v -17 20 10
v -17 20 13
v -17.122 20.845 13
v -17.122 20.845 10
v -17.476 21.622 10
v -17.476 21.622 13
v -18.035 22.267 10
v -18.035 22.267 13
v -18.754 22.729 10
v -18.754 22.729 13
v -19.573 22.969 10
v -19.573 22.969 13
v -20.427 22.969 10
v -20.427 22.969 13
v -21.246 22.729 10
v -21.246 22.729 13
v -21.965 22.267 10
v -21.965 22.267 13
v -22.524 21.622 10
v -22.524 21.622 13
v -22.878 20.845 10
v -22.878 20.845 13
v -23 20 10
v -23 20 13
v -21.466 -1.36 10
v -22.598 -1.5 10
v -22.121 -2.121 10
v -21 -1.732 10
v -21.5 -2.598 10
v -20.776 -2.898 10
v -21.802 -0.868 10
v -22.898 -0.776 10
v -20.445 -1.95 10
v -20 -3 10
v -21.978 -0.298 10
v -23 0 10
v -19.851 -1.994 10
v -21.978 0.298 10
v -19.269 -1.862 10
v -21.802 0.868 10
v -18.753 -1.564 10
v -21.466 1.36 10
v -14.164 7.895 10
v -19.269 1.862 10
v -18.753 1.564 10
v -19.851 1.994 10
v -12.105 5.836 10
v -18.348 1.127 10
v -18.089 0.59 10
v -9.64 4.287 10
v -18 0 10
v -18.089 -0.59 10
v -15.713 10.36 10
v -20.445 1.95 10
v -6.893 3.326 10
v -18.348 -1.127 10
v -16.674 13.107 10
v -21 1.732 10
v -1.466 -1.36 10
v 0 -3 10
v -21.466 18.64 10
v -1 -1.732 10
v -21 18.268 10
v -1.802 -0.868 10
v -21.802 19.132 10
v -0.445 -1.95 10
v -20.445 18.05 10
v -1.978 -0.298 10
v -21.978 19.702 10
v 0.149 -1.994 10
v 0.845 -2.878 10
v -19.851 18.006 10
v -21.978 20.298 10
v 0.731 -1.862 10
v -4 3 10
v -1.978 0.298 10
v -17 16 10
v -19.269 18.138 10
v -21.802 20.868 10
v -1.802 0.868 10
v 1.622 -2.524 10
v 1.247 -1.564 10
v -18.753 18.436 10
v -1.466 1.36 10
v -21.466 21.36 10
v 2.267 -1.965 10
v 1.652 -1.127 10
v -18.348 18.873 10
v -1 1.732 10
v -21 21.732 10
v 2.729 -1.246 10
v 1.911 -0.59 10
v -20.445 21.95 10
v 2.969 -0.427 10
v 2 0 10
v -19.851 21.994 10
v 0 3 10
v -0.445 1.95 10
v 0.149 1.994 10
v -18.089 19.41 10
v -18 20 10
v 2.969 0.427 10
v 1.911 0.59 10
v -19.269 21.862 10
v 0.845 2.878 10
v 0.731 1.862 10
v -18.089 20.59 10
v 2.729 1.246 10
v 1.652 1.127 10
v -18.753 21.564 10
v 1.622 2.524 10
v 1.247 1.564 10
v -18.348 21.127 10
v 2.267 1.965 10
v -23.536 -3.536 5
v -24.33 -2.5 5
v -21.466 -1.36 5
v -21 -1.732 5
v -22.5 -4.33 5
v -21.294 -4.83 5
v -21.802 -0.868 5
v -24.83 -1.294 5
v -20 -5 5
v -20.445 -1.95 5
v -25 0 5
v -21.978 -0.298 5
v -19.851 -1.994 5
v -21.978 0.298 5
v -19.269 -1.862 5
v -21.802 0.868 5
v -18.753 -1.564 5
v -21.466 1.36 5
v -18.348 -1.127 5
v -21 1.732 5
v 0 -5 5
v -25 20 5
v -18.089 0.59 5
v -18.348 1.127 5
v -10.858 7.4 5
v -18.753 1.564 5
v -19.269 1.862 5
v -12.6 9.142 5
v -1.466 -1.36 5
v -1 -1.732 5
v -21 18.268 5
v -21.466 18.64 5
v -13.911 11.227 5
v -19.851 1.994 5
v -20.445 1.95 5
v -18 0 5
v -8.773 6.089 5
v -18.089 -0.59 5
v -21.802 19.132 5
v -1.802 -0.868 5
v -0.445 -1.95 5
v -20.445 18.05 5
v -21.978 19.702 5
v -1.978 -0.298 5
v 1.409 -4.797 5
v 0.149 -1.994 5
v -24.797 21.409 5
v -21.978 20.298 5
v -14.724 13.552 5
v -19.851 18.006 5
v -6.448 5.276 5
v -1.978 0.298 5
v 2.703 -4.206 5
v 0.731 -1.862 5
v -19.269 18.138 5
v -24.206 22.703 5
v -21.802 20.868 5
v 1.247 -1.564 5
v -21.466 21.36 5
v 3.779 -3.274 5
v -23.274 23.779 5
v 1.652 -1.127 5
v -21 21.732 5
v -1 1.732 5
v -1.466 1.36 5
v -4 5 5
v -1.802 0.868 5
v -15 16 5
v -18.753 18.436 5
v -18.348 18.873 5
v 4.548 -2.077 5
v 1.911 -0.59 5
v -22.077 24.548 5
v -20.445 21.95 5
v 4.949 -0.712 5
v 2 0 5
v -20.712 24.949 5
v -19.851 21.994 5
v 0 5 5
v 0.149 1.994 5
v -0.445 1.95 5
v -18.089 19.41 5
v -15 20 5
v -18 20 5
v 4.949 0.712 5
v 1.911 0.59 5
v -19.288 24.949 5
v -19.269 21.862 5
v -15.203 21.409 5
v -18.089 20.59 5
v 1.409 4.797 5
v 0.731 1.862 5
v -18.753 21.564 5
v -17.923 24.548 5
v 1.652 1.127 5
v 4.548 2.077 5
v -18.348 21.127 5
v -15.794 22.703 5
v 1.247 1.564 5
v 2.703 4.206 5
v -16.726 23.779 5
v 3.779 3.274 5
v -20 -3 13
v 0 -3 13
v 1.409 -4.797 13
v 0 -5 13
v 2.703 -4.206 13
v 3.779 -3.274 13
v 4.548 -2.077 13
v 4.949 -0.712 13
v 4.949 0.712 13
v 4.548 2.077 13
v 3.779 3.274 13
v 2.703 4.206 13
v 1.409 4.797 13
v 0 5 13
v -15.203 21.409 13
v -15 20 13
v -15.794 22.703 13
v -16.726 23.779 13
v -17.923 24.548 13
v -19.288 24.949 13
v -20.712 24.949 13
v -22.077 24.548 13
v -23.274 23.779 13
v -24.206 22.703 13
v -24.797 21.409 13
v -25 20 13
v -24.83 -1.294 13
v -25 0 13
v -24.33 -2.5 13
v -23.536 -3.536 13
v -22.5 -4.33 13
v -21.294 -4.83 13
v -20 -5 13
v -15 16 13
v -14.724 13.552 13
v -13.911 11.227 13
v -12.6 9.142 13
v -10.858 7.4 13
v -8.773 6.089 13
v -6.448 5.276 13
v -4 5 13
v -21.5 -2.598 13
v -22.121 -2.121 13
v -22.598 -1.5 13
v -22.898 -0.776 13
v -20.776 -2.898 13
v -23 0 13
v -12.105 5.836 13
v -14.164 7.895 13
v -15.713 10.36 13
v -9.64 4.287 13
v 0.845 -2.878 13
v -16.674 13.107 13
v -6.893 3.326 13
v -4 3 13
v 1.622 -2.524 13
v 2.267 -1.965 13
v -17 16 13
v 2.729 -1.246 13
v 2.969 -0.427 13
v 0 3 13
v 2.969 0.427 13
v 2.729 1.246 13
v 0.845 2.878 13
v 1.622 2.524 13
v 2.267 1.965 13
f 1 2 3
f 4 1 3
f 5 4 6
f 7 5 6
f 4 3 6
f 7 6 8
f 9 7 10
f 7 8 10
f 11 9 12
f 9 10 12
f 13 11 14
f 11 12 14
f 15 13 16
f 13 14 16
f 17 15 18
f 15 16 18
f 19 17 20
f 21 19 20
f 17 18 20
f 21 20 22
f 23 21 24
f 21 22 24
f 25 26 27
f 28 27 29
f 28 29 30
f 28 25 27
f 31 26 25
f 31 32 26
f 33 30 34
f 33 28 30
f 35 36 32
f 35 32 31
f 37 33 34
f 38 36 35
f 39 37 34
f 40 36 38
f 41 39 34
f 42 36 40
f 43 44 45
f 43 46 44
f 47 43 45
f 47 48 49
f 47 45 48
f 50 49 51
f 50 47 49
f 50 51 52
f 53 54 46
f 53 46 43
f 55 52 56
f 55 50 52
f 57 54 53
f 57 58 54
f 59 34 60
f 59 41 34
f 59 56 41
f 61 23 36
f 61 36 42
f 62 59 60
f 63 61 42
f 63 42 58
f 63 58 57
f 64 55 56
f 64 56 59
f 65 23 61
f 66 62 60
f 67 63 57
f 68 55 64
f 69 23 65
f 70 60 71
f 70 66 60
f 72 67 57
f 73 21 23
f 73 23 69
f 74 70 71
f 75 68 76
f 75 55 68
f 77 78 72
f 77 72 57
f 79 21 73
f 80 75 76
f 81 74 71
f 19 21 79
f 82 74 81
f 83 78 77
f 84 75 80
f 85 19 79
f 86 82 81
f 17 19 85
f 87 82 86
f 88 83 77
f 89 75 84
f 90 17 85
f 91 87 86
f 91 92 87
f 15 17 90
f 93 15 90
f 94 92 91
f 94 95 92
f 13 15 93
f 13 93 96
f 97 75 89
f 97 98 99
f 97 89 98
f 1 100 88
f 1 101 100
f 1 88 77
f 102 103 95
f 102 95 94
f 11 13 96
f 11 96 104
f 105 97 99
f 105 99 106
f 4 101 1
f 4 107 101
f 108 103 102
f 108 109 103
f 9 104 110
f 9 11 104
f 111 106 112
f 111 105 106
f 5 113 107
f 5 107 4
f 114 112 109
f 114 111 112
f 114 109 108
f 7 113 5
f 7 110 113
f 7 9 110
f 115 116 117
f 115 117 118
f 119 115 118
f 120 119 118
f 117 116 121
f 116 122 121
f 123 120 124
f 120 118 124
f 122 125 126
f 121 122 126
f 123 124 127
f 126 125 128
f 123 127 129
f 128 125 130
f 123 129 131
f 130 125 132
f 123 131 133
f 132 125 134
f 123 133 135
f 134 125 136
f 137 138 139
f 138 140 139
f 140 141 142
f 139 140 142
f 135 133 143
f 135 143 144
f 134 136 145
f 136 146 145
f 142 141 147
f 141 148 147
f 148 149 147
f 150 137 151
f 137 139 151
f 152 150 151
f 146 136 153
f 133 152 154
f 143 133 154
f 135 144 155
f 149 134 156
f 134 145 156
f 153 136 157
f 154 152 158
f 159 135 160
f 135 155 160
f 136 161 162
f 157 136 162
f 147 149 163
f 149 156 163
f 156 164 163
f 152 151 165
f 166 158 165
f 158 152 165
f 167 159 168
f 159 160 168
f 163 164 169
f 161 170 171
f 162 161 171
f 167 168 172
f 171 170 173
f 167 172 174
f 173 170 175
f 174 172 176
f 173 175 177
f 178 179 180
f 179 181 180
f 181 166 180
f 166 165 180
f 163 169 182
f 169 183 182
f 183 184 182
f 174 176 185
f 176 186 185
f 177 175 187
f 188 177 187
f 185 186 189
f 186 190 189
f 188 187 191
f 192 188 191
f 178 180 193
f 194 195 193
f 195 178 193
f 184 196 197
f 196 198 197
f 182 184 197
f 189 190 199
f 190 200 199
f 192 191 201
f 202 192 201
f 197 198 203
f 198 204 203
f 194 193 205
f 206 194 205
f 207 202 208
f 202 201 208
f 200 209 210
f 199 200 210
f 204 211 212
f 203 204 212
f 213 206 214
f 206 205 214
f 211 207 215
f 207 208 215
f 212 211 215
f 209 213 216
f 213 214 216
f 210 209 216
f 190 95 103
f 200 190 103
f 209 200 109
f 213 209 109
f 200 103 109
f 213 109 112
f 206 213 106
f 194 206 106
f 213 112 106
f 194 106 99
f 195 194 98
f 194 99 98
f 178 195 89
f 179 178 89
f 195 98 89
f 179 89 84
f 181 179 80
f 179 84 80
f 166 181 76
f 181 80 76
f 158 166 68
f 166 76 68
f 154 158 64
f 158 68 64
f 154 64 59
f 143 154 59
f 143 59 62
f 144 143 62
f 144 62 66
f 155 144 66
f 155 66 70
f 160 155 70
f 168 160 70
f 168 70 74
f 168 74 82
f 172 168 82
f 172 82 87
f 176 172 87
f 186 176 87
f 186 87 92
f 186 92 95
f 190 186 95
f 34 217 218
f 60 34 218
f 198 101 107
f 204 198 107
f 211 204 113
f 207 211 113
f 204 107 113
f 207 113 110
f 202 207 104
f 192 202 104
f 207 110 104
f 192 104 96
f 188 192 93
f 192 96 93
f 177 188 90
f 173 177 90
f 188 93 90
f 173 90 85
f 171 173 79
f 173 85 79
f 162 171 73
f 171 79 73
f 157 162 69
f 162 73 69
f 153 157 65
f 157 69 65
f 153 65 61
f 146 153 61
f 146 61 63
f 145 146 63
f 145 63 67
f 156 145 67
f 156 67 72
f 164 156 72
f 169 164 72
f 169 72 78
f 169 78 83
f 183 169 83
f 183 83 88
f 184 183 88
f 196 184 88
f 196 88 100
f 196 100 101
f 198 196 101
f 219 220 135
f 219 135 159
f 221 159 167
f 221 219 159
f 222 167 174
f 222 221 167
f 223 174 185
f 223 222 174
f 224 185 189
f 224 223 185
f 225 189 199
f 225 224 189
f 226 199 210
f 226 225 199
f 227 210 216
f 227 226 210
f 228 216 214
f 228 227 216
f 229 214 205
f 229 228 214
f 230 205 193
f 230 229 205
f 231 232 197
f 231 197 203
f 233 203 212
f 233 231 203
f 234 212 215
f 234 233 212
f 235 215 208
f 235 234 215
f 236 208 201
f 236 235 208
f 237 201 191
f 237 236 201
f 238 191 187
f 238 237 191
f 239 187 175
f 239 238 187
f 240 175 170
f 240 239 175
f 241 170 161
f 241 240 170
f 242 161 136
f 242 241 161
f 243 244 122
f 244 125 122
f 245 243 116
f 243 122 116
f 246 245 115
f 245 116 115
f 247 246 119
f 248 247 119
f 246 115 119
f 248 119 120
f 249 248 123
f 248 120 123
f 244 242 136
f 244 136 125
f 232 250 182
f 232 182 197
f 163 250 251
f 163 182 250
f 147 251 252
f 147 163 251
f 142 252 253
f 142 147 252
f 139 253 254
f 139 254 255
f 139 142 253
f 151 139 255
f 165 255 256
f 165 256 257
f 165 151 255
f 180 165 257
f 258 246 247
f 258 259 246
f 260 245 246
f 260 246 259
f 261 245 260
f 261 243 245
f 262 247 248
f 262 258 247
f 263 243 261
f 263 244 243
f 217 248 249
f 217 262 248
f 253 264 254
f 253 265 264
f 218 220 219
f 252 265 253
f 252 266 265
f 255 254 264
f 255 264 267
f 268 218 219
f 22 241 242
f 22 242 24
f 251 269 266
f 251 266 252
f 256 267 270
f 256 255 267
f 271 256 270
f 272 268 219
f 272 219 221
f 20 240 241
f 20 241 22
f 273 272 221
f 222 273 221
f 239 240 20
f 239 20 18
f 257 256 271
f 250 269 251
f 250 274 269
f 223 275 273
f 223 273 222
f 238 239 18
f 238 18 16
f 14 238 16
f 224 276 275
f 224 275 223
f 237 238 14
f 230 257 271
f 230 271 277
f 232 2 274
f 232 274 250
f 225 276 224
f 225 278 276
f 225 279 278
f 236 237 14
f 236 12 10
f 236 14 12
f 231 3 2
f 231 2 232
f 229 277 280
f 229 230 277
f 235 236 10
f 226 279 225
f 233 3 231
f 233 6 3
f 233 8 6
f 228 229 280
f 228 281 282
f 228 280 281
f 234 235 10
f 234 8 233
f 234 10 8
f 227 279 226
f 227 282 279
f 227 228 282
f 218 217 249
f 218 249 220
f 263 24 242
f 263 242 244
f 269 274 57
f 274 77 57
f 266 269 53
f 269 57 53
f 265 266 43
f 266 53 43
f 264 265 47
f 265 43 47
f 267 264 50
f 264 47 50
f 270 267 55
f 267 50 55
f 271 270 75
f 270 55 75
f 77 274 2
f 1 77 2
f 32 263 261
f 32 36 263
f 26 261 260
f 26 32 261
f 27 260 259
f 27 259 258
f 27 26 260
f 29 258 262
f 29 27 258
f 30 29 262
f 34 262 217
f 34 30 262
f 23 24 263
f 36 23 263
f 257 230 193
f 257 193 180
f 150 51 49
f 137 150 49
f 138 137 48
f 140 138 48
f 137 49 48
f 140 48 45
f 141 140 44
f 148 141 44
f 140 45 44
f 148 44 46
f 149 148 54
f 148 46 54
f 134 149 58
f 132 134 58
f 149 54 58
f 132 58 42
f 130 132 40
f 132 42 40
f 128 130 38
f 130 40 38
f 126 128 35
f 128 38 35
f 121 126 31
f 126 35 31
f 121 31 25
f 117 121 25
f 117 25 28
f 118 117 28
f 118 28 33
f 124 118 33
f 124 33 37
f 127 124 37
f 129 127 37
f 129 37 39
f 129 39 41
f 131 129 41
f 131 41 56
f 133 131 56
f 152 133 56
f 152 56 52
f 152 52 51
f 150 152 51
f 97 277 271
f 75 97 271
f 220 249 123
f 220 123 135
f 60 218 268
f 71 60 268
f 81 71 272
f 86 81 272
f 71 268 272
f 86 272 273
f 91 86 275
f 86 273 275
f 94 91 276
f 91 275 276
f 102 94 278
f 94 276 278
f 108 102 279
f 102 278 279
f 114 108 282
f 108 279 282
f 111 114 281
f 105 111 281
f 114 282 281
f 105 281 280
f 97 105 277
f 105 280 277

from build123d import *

# Parameters (mm, degrees)
BOSS_EXTRUDE1_DEPTH          = 8
CUT_EXTRUDE1_DEPTH           = 3
F_4_0_4_DIAMETER_HOLE1_D     = 4
F_4_0_4_DIAMETER_HOLE1_DEPTH = 8
FILLET1_R                    = 3
FILLET2_R                    = 5
FILLET3_R                    = 11
FILLET4_R                    = 13


with BuildPart() as part:
    # Sketch1 → Boss-Extrude1 (new body)
    with BuildSketch(Plane.XY.offset(13)):
        with BuildLine():
            Line((-15, 5), (-15, 20))
            ThreePointArc((-15, 20), (-20, 25), (-25, 20))
            Line((-25, 20), (-25, -5))
            Line((-25, -5), (0, -5))
            ThreePointArc((0, -5), (5, 0), (0, 5))
            Line((0, 5), (-15, 5))
        make_face()
    extrude(amount=-BOSS_EXTRUDE1_DEPTH)

    # Sketch2 → Cut-Extrude1 (cut)
    with BuildSketch(Plane.XY.offset(13)):
        with BuildLine():
            Line((-23, 20), (-23, -3))
            Line((-23, -3), (0, -3))
            ThreePointArc((0, -3), (3, 0), (0, 3))
            Line((0, 3), (-17, 3))
            Line((-17, 3), (-17, 20))
            ThreePointArc((-17, 20), (-20, 23), (-23, 20))
        make_face()
    extrude(amount=-CUT_EXTRUDE1_DEPTH, mode=Mode.SUBTRACT)

    # Ø4.0 (4) Diameter Hole1
    with Locations(Plane(origin=(0, 0, 5), x_dir=(-1, 0, 0), z_dir=(0, 0, -1))):
        with Locations((20, 20), (20, 0), (0, 0)):
            Hole(F_4_0_4_DIAMETER_HOLE1_D / 2, depth=F_4_0_4_DIAMETER_HOLE1_DEPTH)

    # Fillet1
    fillet1_edges = [part.edges().sort_by_distance(p)[0] for p in [
        (-23, -3, 11.5),
    ]]
    fillet(fillet1_edges, radius=FILLET1_R)

    # Fillet2
    fillet2_edges = [part.edges().sort_by_distance(p)[0] for p in [
        (-25, -5, 9),
    ]]
    fillet(fillet2_edges, radius=FILLET2_R)

    # Fillet3
    fillet3_edges = [part.edges().sort_by_distance(p)[0] for p in [
        (-15, 5, 9),
    ]]
    fillet(fillet3_edges, radius=FILLET3_R)

    # Fillet4
    fillet4_edges = [part.edges().sort_by_distance(p)[0] for p in [
        (-17, 3, 11.5),
    ]]
    fillet(fillet4_edges, radius=FILLET4_R)


solid = part.part
